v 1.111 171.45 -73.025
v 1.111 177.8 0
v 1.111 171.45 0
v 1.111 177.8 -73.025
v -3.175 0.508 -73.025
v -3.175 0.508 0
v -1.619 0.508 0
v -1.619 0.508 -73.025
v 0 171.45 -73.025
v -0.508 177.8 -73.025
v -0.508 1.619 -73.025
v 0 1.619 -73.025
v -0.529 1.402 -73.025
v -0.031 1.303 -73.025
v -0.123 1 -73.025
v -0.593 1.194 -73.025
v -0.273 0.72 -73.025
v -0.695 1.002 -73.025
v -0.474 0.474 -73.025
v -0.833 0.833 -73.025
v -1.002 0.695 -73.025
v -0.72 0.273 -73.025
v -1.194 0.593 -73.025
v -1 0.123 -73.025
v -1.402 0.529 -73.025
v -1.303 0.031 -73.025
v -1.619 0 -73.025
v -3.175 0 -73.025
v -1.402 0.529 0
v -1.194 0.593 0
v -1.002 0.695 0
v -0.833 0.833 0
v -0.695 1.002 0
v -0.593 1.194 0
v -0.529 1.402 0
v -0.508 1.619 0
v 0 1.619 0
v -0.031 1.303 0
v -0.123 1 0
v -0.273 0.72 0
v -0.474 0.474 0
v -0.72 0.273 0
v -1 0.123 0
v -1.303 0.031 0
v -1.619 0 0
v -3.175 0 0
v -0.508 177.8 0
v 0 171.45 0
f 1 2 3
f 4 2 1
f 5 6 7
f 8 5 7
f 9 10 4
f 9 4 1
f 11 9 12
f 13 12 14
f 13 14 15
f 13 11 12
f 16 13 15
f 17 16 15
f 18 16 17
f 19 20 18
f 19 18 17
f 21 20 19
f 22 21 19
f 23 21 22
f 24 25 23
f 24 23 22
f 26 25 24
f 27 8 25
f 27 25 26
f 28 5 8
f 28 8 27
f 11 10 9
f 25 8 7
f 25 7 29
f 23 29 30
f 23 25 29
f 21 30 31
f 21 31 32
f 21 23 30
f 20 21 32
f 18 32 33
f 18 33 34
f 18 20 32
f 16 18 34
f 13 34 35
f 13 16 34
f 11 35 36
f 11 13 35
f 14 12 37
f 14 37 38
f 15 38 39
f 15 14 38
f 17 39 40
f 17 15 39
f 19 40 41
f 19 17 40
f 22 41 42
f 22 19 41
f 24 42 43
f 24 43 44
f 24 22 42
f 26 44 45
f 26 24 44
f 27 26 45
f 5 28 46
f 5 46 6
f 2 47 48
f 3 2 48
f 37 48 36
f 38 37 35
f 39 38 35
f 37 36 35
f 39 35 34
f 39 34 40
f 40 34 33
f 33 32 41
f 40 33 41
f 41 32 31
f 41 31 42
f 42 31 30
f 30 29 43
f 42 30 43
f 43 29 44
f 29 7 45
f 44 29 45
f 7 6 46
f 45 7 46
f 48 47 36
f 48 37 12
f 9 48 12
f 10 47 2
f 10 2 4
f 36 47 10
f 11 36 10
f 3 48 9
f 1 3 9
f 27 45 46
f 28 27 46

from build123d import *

# Parameters (mm, degrees)
SKETCH1_W                    = 73.025
SKETCH1_H                    = 177.8
BASE_FLANGE1_DEPTH           = 0.508
SKETCH2_W                    = 73.025
SKETCH2_H                    = 6.35
BOSS_EXTRUDE1_DEPTH          = 1.11125
EDGE_FLANGE1_STRIP_W         = 4.2545
EDGE_FLANGE1_STRIP_H         = 0.508
EDGE_FLANGE1_STRIP_CUT_DEPTH = 73.025
EDGE_FLANGE1_DEPTH           = 73.025


# Sheet-metal steps are written as plain solids
with BuildPart() as part:
    # Sketch1 → Base-Flange1 (new body)
    with BuildSketch(Plane(origin=(0, 0, 0), x_dir=(0, 0, -1), z_dir=(1, 0, 0))):
        with Locations((36.5125, 88.9)):
            Rectangle(SKETCH1_W, SKETCH1_H)
    extrude(amount=-BASE_FLANGE1_DEPTH)

    # Sketch2 → Boss-Extrude1 (add)
    with BuildSketch(Plane(origin=(0, 0, 0), x_dir=(0, 0, -1), z_dir=(1, 0, 0))):
        with Locations((36.5125, 174.625)):
            Rectangle(SKETCH2_W, SKETCH2_H)
    extrude(amount=BOSS_EXTRUDE1_DEPTH)

    # Edge-Flange1 strip (across the edge) → Edge-Flange1 strip cut (cut)
    with BuildSketch(Plane(origin=(-0.508, 0, -73.025), x_dir=(0, 1, 0), z_dir=(0, 0, 1))):
        with Locations((-0.508, -0.254)):
            Rectangle(EDGE_FLANGE1_STRIP_W, EDGE_FLANGE1_STRIP_H)
    extrude(amount=EDGE_FLANGE1_STRIP_CUT_DEPTH, mode=Mode.SUBTRACT)

    # Edge-Flange1 section (across the edge) → Edge-Flange1 (add)
    with BuildSketch(Plane(origin=(-0.508, 0, -73.025), x_dir=(0, 1, 0), z_dir=(0, 0, 1))):
        with BuildLine():
            Line((0, 1.11125), (0, 2.667))
            Line((0, 2.667), (0.508, 2.667))
            Line((0.508, 2.667), (0.508, 1.11125))
            ThreePointArc((0.508, 1.11125), (0.833477589, 0.325477589), (1.61925, 0))
            Line((1.61925, 0), (1.61925, -0.508))
            ThreePointArc((1.61925, -0.508), (0.474267345, -0.033732655), (0, 1.11125))
        make_face()
    extrude(amount=EDGE_FLANGE1_DEPTH)


solid = part.part
